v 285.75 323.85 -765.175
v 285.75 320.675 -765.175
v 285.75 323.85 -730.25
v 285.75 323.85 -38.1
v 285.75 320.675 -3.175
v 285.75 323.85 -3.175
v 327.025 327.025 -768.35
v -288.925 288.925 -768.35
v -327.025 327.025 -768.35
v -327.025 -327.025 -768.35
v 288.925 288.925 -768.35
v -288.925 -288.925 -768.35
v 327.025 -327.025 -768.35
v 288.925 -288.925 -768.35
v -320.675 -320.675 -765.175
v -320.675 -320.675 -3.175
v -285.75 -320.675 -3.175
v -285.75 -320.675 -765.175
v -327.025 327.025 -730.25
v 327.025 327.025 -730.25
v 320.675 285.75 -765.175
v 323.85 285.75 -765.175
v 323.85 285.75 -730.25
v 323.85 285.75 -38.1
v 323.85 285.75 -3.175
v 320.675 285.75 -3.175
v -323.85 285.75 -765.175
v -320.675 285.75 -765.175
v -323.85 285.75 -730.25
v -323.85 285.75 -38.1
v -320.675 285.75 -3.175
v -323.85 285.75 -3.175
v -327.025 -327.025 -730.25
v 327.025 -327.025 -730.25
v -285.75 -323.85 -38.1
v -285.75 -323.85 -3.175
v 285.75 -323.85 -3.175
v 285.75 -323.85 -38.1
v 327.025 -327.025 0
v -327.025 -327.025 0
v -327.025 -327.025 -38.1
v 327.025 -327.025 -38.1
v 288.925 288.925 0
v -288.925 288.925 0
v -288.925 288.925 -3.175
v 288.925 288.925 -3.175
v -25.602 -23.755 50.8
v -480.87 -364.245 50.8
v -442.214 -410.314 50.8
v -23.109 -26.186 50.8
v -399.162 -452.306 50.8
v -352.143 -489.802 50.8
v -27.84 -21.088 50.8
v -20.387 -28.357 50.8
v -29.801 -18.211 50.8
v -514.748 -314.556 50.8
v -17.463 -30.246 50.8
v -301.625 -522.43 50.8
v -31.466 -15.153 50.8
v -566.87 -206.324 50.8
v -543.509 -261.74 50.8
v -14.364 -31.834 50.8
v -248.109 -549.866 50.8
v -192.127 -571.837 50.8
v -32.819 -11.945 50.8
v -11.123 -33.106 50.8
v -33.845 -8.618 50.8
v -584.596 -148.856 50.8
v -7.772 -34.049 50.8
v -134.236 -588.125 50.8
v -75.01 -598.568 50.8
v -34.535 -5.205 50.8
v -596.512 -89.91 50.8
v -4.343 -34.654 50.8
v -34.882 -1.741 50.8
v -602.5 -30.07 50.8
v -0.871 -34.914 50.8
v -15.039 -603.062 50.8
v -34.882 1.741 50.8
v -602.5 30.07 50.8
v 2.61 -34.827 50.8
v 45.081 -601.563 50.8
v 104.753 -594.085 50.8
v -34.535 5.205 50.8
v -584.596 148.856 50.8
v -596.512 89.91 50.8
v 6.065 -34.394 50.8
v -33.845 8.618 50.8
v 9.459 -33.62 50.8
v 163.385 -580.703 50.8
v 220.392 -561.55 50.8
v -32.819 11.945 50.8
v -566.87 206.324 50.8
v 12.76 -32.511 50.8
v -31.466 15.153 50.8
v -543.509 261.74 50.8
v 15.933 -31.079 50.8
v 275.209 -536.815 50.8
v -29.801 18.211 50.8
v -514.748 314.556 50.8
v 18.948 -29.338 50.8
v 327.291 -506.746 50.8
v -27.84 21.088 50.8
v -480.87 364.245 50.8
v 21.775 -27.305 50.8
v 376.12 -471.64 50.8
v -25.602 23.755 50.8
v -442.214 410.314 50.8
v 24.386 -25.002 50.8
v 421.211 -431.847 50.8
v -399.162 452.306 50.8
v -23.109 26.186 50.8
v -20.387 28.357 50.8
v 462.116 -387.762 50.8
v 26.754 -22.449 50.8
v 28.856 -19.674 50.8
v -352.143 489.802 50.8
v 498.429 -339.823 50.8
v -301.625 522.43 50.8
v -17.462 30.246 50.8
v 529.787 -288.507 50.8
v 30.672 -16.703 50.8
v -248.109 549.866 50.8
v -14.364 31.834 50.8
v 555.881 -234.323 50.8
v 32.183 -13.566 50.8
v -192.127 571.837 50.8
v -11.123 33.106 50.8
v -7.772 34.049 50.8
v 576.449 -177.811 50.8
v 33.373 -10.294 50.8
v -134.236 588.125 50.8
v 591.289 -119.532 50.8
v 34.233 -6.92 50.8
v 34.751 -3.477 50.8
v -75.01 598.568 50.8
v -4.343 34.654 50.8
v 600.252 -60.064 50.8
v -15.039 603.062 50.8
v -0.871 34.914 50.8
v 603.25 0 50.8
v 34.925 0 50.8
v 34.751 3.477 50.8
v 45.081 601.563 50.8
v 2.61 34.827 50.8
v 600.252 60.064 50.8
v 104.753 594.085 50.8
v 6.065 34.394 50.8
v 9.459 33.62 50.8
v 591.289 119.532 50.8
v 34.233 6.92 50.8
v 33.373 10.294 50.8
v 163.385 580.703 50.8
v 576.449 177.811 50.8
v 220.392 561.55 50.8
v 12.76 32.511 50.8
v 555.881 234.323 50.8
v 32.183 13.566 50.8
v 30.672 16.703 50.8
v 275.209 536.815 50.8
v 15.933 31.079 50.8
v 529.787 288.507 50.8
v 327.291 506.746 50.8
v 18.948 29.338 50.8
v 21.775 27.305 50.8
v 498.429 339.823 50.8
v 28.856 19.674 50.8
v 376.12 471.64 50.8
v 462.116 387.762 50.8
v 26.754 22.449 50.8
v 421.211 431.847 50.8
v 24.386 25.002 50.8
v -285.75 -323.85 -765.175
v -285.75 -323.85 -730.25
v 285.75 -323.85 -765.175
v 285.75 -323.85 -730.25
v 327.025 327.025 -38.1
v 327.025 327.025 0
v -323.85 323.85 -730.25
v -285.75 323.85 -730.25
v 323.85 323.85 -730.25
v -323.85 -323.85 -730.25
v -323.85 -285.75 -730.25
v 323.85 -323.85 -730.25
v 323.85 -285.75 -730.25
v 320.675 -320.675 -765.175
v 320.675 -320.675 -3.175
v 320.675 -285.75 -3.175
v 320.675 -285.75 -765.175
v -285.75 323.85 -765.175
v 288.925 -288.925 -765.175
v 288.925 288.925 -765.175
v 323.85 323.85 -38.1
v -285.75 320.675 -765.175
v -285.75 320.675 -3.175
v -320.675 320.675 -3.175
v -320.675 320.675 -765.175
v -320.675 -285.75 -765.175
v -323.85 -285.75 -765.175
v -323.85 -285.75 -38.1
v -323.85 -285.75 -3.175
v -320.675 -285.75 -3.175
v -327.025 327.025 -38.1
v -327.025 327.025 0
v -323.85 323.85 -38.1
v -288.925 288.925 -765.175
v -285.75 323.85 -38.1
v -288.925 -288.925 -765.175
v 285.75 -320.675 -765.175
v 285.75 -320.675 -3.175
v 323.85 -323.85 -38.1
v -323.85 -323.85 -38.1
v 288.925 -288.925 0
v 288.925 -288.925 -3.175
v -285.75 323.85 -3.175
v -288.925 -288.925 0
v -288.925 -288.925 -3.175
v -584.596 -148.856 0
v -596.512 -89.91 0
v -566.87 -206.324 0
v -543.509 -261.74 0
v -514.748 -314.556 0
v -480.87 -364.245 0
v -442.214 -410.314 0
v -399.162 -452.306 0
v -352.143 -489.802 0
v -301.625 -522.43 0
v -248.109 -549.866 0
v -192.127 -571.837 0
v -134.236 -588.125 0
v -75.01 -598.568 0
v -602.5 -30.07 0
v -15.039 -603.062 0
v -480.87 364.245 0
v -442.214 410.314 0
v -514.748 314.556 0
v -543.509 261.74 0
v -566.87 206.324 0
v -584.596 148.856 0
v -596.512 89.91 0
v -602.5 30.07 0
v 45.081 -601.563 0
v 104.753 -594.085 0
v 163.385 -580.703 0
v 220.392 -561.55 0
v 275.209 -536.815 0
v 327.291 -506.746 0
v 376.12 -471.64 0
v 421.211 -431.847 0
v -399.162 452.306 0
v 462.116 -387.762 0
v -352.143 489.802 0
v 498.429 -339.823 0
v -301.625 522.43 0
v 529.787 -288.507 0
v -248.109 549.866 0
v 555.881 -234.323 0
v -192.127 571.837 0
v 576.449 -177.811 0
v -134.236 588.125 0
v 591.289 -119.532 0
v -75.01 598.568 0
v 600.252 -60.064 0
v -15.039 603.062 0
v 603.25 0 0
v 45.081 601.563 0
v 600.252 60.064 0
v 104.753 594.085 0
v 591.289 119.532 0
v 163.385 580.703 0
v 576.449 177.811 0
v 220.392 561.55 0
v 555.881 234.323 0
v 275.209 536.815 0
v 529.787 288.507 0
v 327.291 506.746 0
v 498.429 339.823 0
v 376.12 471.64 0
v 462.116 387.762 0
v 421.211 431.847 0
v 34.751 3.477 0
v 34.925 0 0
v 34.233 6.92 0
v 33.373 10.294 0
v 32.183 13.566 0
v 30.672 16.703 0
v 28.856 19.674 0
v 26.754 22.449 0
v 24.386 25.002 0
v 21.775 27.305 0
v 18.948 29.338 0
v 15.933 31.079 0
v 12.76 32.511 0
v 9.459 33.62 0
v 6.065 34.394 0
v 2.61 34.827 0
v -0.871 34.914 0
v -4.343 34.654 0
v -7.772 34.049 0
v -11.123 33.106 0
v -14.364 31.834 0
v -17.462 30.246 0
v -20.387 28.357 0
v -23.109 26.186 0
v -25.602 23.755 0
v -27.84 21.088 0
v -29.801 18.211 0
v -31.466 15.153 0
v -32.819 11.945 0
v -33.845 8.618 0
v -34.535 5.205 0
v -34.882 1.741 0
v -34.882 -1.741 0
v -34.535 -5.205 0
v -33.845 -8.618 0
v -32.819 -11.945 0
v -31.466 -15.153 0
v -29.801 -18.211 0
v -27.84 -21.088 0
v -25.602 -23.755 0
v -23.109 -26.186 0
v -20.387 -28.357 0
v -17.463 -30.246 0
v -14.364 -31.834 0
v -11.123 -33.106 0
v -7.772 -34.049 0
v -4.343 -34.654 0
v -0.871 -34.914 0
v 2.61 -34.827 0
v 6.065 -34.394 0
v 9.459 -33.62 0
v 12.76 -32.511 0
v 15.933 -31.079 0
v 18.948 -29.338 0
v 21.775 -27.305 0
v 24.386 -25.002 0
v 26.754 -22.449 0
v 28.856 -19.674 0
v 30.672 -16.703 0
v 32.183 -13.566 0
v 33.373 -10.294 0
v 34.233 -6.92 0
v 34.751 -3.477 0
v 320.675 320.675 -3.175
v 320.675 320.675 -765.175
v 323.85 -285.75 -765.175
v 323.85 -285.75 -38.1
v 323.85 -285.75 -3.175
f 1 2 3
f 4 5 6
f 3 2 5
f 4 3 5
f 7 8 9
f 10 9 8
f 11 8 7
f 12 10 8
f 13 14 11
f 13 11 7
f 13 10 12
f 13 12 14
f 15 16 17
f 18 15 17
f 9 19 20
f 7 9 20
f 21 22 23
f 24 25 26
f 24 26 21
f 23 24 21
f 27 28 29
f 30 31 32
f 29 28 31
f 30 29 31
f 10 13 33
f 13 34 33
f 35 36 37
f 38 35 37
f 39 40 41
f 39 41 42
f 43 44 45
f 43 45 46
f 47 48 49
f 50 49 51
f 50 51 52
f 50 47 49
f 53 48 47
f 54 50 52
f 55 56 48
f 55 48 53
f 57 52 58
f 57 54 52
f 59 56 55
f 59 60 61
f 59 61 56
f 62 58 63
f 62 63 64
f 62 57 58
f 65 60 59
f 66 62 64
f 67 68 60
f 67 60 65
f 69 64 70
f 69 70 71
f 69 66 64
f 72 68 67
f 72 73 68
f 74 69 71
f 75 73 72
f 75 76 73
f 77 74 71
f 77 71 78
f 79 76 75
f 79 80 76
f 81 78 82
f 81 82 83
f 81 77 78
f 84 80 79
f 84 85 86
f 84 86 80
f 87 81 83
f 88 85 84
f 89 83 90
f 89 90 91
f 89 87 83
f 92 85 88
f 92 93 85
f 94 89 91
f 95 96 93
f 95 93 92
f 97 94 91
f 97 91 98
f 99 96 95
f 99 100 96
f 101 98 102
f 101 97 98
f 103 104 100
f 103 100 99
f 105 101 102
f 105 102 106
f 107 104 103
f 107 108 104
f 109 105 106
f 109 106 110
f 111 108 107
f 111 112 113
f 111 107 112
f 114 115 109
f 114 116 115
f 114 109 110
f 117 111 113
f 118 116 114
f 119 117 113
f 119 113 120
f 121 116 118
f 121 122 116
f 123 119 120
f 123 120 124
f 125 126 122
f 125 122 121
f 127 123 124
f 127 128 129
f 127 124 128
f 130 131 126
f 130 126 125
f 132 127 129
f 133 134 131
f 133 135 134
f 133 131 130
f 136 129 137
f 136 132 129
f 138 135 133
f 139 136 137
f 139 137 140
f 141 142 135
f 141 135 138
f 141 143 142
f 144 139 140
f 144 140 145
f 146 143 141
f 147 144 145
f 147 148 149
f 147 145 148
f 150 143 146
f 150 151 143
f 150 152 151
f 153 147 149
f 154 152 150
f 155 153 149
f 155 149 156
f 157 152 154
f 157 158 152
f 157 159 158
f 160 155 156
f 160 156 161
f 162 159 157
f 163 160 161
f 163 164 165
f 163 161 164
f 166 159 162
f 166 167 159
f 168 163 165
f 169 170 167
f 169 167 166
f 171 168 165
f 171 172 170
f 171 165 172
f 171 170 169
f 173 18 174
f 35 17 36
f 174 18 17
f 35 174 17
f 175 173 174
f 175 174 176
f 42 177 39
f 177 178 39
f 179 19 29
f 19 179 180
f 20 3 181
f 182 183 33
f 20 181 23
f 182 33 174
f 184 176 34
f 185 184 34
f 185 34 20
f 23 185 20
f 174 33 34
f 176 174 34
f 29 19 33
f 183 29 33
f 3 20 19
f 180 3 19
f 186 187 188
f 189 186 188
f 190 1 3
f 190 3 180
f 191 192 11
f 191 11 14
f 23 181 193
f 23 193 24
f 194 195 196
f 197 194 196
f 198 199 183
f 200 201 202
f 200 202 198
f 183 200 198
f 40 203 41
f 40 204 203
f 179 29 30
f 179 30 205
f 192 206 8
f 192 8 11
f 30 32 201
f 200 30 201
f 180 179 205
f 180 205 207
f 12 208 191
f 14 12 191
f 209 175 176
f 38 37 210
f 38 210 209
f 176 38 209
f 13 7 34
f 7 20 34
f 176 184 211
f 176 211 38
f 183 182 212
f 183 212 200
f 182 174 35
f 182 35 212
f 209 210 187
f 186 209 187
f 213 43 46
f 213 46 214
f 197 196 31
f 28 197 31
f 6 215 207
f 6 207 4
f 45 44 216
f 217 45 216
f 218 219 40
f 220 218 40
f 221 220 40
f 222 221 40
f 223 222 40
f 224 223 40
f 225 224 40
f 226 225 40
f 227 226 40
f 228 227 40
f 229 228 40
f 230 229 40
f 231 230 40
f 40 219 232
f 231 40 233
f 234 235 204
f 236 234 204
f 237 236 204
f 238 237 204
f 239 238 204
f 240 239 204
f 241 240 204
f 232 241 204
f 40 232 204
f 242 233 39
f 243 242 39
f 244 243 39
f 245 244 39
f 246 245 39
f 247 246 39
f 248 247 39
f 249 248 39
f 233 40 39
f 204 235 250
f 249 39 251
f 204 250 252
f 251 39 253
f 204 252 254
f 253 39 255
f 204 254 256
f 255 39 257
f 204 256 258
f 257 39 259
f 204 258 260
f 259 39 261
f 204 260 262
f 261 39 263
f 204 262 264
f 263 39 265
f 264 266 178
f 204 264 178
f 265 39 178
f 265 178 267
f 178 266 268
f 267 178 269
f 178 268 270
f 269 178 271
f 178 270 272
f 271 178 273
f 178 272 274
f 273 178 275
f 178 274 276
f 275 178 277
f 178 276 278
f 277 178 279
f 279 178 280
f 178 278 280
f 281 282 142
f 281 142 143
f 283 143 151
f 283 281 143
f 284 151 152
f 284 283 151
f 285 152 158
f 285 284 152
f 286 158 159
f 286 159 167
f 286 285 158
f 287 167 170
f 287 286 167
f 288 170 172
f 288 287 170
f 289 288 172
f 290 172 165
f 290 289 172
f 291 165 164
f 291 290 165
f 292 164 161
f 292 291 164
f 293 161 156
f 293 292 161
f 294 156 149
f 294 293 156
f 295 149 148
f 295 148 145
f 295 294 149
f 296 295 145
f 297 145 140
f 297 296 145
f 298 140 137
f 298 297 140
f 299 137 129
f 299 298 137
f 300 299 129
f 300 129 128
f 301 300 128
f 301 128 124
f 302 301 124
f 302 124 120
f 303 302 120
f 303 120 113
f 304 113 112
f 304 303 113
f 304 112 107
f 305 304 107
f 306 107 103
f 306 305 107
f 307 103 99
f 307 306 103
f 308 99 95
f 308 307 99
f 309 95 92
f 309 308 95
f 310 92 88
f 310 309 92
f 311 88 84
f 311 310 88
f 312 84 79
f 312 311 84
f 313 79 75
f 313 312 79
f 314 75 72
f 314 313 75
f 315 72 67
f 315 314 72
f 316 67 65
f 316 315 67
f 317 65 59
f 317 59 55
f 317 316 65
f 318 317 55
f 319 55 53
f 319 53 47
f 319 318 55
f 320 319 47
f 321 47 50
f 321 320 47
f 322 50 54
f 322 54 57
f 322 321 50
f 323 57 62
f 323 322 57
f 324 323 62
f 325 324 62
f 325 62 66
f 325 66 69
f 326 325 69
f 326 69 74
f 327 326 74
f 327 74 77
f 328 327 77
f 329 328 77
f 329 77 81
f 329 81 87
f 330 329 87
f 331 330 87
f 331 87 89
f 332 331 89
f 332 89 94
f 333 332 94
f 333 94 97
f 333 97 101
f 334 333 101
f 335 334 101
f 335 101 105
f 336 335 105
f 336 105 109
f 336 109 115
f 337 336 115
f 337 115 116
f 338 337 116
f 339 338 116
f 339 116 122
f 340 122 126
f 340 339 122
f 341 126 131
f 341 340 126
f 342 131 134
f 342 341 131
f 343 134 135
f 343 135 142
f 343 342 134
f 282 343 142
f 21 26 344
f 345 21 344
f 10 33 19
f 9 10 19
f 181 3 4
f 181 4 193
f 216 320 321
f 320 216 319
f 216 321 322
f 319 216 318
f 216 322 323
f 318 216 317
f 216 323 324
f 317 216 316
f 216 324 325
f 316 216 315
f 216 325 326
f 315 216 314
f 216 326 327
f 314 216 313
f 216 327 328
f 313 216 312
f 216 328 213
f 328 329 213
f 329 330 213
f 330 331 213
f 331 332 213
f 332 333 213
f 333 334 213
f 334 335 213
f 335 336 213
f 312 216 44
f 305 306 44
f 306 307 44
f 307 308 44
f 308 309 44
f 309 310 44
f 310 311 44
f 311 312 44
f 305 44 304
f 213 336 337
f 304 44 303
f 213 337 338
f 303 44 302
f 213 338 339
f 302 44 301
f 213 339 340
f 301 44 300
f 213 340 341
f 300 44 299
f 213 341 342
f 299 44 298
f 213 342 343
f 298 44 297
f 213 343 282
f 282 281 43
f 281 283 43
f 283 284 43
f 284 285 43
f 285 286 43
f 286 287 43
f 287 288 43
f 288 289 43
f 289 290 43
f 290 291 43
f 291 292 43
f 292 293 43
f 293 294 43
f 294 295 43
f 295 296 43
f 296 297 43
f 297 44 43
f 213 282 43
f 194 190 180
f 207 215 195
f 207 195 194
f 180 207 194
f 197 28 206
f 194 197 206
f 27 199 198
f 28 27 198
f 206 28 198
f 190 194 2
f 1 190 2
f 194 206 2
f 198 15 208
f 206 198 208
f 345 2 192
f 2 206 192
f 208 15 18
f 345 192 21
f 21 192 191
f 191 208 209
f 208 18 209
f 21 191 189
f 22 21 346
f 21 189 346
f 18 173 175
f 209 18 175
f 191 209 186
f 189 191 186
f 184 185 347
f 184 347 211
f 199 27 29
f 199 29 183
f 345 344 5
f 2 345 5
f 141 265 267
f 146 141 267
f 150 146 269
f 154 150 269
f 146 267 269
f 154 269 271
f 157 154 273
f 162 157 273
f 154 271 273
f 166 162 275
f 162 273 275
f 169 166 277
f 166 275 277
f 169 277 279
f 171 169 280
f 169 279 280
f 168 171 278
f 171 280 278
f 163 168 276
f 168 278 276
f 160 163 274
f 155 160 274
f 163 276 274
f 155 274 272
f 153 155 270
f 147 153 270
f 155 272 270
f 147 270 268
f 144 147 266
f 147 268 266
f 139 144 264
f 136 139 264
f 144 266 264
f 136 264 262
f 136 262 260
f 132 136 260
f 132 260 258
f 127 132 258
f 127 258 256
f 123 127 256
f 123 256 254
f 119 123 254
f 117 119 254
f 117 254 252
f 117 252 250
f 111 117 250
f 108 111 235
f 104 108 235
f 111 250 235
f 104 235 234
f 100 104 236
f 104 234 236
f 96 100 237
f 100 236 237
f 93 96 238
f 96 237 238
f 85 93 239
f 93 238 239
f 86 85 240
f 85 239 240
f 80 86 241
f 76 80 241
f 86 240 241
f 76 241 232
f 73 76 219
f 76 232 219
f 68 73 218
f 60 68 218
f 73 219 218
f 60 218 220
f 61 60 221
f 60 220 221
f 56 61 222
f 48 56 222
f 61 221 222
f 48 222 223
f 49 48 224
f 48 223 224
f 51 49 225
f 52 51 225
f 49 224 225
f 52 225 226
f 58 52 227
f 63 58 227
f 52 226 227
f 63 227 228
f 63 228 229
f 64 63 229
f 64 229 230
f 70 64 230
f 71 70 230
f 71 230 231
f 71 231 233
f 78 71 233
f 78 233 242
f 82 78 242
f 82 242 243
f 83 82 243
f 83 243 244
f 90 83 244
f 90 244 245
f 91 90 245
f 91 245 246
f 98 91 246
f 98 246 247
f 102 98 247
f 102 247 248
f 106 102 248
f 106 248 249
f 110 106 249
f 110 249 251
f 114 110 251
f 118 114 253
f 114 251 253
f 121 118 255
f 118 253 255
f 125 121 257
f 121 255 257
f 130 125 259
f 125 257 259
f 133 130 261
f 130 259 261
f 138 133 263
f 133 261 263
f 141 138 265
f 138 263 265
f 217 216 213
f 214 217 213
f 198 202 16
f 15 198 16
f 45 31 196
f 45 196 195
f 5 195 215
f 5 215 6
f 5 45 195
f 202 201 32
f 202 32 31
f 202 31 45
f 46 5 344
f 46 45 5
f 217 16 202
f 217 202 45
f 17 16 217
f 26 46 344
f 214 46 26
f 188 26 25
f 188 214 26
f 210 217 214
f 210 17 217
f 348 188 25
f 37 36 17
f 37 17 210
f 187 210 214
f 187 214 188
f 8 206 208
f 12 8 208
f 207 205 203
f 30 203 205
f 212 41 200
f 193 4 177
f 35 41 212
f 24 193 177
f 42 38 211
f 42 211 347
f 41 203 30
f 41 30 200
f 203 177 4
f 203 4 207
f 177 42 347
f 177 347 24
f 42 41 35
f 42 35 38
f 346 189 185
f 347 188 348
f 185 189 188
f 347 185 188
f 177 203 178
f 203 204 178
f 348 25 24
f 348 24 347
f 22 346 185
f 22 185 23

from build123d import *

# Parameters (mm, degrees)
F0_R      = 603.25
F0_R_2    = 34.925
F1_DEPTH  = 50.8
F2_W      = 654.05
F2_H      = 654.05
F2_W_2    = 577.85
F2_H_2    = 577.85
F3_DEPTH  = 3.175
F4_W      = 654.05
F4_H      = 654.05
F4_W_2    = 647.7
F4_H_2    = 647.7
F5_DEPTH  = 34.925
F7_DEPTH  = 762
F9_DEPTH  = 762
F11_DEPTH = 762
F13_DEPTH = 762
F14_W     = 3.175
F14_H     = 3.175
F15_DEPTH = 34.925
F16_W     = 577.85
F16_H     = 577.85
F17_DEPTH = 3.175


with BuildPart() as f1:
    # F0 (on Top) → F1 (new body)
    with BuildSketch(Plane.XY):
        Circle(F0_R)
        Circle(F0_R_2, mode=Mode.SUBTRACT)
    extrude(amount=F1_DEPTH)

    # F2 (on face) → F3 (join)
    with BuildSketch(Plane(origin=(0, 0, 0), x_dir=(1, 0, 0), z_dir=(0, 0, -1))):
        Rectangle(F2_W, F2_H)
        Rectangle(F2_W_2, F2_H_2, mode=Mode.SUBTRACT)
    extrude(amount=F3_DEPTH)

    # F4 (on face) → F5 (join)
    with BuildSketch(Plane(origin=(0, 0, -3.175), x_dir=(1, 0, 0), z_dir=(0, 0, -1))):
        Rectangle(F4_W, F4_H)
        Rectangle(F4_W_2, F4_H_2, mode=Mode.SUBTRACT)
    extrude(amount=F5_DEPTH)

    # F6 (on face) → F7 (join)
    with BuildSketch(Plane(origin=(0, 0, -3.175), x_dir=(1, 0, 0), z_dir=(0, 0, -1))):
        Polygon((-285.75, 323.85), (-323.85, 323.85), (-323.85, 285.75), (-320.675, 285.75), (-320.675, 320.675), (-285.75, 320.675), align=None)
    extrude(amount=F7_DEPTH)

    # F8 (on face) → F9 (join)
    with BuildSketch(Plane(origin=(0, 0, -3.175), x_dir=(1, 0, 0), z_dir=(0, 0, -1))):
        Polygon((323.85, 285.75), (323.85, 323.85), (285.75, 323.85), (285.75, 320.675), (320.675, 320.675), (320.675, 285.75), align=None)
    extrude(amount=F9_DEPTH)

    # F10 (on face) → F11 (join)
    with BuildSketch(Plane(origin=(0, 0, -3.175), x_dir=(1, 0, 0), z_dir=(0, 0, -1))):
        Polygon((285.75, -323.85), (323.85, -323.85), (323.85, -285.75), (320.675, -285.75), (320.675, -320.675), (285.75, -320.675), align=None)
    extrude(amount=F11_DEPTH)

    # F12 (on face) → F13 (join)
    with BuildSketch(Plane(origin=(0, 0, -3.175), x_dir=(1, 0, 0), z_dir=(0, 0, -1))):
        Polygon((-323.85, -285.75), (-323.85, -323.85), (-285.75, -323.85), (-285.75, -320.675), (-320.675, -320.675), (-320.675, -285.75), align=None)
    extrude(amount=F13_DEPTH)

    # F14 (on face) → F15 (join)
    with BuildSketch(Plane(origin=(0, 0, -765.175), x_dir=(1, 0, 0), z_dir=(0, 0, -1))):
        with Locations((-325.4375, -325.4375)):
            Rectangle(F14_W, F14_H)
        Polygon((323.85, -323.85), (-323.85, -323.85), (-323.85, -327.025), (327.025, -327.025), (327.025, 323.85), (323.85, 323.85), align=None)
        Polygon((-327.025, -323.85), (-323.85, -323.85), (-323.85, 323.85), (323.85, 323.85), (323.85, 327.025), (-327.025, 327.025), align=None)
        with Locations((325.4375, 325.4375)):
            Rectangle(F14_W, F14_H)
    extrude(amount=-F15_DEPTH)

    # F16 (on face) → F17 (join)
    with BuildSketch(Plane(origin=(0, 0, -765.175), x_dir=(1, 0, 0), z_dir=(0, 0, -1))):
        Polygon((-327.025, -288.925), (-327.025, -327.025), (288.925, -327.025), (327.025, -327.025), (327.025, -288.925), (327.025, 327.025), (288.925, 327.025), (-288.925, 327.025), (-327.025, 327.025), align=None)
        Rectangle(F16_W, F16_H, mode=Mode.SUBTRACT)
    extrude(amount=F17_DEPTH)


solid = f1.part
